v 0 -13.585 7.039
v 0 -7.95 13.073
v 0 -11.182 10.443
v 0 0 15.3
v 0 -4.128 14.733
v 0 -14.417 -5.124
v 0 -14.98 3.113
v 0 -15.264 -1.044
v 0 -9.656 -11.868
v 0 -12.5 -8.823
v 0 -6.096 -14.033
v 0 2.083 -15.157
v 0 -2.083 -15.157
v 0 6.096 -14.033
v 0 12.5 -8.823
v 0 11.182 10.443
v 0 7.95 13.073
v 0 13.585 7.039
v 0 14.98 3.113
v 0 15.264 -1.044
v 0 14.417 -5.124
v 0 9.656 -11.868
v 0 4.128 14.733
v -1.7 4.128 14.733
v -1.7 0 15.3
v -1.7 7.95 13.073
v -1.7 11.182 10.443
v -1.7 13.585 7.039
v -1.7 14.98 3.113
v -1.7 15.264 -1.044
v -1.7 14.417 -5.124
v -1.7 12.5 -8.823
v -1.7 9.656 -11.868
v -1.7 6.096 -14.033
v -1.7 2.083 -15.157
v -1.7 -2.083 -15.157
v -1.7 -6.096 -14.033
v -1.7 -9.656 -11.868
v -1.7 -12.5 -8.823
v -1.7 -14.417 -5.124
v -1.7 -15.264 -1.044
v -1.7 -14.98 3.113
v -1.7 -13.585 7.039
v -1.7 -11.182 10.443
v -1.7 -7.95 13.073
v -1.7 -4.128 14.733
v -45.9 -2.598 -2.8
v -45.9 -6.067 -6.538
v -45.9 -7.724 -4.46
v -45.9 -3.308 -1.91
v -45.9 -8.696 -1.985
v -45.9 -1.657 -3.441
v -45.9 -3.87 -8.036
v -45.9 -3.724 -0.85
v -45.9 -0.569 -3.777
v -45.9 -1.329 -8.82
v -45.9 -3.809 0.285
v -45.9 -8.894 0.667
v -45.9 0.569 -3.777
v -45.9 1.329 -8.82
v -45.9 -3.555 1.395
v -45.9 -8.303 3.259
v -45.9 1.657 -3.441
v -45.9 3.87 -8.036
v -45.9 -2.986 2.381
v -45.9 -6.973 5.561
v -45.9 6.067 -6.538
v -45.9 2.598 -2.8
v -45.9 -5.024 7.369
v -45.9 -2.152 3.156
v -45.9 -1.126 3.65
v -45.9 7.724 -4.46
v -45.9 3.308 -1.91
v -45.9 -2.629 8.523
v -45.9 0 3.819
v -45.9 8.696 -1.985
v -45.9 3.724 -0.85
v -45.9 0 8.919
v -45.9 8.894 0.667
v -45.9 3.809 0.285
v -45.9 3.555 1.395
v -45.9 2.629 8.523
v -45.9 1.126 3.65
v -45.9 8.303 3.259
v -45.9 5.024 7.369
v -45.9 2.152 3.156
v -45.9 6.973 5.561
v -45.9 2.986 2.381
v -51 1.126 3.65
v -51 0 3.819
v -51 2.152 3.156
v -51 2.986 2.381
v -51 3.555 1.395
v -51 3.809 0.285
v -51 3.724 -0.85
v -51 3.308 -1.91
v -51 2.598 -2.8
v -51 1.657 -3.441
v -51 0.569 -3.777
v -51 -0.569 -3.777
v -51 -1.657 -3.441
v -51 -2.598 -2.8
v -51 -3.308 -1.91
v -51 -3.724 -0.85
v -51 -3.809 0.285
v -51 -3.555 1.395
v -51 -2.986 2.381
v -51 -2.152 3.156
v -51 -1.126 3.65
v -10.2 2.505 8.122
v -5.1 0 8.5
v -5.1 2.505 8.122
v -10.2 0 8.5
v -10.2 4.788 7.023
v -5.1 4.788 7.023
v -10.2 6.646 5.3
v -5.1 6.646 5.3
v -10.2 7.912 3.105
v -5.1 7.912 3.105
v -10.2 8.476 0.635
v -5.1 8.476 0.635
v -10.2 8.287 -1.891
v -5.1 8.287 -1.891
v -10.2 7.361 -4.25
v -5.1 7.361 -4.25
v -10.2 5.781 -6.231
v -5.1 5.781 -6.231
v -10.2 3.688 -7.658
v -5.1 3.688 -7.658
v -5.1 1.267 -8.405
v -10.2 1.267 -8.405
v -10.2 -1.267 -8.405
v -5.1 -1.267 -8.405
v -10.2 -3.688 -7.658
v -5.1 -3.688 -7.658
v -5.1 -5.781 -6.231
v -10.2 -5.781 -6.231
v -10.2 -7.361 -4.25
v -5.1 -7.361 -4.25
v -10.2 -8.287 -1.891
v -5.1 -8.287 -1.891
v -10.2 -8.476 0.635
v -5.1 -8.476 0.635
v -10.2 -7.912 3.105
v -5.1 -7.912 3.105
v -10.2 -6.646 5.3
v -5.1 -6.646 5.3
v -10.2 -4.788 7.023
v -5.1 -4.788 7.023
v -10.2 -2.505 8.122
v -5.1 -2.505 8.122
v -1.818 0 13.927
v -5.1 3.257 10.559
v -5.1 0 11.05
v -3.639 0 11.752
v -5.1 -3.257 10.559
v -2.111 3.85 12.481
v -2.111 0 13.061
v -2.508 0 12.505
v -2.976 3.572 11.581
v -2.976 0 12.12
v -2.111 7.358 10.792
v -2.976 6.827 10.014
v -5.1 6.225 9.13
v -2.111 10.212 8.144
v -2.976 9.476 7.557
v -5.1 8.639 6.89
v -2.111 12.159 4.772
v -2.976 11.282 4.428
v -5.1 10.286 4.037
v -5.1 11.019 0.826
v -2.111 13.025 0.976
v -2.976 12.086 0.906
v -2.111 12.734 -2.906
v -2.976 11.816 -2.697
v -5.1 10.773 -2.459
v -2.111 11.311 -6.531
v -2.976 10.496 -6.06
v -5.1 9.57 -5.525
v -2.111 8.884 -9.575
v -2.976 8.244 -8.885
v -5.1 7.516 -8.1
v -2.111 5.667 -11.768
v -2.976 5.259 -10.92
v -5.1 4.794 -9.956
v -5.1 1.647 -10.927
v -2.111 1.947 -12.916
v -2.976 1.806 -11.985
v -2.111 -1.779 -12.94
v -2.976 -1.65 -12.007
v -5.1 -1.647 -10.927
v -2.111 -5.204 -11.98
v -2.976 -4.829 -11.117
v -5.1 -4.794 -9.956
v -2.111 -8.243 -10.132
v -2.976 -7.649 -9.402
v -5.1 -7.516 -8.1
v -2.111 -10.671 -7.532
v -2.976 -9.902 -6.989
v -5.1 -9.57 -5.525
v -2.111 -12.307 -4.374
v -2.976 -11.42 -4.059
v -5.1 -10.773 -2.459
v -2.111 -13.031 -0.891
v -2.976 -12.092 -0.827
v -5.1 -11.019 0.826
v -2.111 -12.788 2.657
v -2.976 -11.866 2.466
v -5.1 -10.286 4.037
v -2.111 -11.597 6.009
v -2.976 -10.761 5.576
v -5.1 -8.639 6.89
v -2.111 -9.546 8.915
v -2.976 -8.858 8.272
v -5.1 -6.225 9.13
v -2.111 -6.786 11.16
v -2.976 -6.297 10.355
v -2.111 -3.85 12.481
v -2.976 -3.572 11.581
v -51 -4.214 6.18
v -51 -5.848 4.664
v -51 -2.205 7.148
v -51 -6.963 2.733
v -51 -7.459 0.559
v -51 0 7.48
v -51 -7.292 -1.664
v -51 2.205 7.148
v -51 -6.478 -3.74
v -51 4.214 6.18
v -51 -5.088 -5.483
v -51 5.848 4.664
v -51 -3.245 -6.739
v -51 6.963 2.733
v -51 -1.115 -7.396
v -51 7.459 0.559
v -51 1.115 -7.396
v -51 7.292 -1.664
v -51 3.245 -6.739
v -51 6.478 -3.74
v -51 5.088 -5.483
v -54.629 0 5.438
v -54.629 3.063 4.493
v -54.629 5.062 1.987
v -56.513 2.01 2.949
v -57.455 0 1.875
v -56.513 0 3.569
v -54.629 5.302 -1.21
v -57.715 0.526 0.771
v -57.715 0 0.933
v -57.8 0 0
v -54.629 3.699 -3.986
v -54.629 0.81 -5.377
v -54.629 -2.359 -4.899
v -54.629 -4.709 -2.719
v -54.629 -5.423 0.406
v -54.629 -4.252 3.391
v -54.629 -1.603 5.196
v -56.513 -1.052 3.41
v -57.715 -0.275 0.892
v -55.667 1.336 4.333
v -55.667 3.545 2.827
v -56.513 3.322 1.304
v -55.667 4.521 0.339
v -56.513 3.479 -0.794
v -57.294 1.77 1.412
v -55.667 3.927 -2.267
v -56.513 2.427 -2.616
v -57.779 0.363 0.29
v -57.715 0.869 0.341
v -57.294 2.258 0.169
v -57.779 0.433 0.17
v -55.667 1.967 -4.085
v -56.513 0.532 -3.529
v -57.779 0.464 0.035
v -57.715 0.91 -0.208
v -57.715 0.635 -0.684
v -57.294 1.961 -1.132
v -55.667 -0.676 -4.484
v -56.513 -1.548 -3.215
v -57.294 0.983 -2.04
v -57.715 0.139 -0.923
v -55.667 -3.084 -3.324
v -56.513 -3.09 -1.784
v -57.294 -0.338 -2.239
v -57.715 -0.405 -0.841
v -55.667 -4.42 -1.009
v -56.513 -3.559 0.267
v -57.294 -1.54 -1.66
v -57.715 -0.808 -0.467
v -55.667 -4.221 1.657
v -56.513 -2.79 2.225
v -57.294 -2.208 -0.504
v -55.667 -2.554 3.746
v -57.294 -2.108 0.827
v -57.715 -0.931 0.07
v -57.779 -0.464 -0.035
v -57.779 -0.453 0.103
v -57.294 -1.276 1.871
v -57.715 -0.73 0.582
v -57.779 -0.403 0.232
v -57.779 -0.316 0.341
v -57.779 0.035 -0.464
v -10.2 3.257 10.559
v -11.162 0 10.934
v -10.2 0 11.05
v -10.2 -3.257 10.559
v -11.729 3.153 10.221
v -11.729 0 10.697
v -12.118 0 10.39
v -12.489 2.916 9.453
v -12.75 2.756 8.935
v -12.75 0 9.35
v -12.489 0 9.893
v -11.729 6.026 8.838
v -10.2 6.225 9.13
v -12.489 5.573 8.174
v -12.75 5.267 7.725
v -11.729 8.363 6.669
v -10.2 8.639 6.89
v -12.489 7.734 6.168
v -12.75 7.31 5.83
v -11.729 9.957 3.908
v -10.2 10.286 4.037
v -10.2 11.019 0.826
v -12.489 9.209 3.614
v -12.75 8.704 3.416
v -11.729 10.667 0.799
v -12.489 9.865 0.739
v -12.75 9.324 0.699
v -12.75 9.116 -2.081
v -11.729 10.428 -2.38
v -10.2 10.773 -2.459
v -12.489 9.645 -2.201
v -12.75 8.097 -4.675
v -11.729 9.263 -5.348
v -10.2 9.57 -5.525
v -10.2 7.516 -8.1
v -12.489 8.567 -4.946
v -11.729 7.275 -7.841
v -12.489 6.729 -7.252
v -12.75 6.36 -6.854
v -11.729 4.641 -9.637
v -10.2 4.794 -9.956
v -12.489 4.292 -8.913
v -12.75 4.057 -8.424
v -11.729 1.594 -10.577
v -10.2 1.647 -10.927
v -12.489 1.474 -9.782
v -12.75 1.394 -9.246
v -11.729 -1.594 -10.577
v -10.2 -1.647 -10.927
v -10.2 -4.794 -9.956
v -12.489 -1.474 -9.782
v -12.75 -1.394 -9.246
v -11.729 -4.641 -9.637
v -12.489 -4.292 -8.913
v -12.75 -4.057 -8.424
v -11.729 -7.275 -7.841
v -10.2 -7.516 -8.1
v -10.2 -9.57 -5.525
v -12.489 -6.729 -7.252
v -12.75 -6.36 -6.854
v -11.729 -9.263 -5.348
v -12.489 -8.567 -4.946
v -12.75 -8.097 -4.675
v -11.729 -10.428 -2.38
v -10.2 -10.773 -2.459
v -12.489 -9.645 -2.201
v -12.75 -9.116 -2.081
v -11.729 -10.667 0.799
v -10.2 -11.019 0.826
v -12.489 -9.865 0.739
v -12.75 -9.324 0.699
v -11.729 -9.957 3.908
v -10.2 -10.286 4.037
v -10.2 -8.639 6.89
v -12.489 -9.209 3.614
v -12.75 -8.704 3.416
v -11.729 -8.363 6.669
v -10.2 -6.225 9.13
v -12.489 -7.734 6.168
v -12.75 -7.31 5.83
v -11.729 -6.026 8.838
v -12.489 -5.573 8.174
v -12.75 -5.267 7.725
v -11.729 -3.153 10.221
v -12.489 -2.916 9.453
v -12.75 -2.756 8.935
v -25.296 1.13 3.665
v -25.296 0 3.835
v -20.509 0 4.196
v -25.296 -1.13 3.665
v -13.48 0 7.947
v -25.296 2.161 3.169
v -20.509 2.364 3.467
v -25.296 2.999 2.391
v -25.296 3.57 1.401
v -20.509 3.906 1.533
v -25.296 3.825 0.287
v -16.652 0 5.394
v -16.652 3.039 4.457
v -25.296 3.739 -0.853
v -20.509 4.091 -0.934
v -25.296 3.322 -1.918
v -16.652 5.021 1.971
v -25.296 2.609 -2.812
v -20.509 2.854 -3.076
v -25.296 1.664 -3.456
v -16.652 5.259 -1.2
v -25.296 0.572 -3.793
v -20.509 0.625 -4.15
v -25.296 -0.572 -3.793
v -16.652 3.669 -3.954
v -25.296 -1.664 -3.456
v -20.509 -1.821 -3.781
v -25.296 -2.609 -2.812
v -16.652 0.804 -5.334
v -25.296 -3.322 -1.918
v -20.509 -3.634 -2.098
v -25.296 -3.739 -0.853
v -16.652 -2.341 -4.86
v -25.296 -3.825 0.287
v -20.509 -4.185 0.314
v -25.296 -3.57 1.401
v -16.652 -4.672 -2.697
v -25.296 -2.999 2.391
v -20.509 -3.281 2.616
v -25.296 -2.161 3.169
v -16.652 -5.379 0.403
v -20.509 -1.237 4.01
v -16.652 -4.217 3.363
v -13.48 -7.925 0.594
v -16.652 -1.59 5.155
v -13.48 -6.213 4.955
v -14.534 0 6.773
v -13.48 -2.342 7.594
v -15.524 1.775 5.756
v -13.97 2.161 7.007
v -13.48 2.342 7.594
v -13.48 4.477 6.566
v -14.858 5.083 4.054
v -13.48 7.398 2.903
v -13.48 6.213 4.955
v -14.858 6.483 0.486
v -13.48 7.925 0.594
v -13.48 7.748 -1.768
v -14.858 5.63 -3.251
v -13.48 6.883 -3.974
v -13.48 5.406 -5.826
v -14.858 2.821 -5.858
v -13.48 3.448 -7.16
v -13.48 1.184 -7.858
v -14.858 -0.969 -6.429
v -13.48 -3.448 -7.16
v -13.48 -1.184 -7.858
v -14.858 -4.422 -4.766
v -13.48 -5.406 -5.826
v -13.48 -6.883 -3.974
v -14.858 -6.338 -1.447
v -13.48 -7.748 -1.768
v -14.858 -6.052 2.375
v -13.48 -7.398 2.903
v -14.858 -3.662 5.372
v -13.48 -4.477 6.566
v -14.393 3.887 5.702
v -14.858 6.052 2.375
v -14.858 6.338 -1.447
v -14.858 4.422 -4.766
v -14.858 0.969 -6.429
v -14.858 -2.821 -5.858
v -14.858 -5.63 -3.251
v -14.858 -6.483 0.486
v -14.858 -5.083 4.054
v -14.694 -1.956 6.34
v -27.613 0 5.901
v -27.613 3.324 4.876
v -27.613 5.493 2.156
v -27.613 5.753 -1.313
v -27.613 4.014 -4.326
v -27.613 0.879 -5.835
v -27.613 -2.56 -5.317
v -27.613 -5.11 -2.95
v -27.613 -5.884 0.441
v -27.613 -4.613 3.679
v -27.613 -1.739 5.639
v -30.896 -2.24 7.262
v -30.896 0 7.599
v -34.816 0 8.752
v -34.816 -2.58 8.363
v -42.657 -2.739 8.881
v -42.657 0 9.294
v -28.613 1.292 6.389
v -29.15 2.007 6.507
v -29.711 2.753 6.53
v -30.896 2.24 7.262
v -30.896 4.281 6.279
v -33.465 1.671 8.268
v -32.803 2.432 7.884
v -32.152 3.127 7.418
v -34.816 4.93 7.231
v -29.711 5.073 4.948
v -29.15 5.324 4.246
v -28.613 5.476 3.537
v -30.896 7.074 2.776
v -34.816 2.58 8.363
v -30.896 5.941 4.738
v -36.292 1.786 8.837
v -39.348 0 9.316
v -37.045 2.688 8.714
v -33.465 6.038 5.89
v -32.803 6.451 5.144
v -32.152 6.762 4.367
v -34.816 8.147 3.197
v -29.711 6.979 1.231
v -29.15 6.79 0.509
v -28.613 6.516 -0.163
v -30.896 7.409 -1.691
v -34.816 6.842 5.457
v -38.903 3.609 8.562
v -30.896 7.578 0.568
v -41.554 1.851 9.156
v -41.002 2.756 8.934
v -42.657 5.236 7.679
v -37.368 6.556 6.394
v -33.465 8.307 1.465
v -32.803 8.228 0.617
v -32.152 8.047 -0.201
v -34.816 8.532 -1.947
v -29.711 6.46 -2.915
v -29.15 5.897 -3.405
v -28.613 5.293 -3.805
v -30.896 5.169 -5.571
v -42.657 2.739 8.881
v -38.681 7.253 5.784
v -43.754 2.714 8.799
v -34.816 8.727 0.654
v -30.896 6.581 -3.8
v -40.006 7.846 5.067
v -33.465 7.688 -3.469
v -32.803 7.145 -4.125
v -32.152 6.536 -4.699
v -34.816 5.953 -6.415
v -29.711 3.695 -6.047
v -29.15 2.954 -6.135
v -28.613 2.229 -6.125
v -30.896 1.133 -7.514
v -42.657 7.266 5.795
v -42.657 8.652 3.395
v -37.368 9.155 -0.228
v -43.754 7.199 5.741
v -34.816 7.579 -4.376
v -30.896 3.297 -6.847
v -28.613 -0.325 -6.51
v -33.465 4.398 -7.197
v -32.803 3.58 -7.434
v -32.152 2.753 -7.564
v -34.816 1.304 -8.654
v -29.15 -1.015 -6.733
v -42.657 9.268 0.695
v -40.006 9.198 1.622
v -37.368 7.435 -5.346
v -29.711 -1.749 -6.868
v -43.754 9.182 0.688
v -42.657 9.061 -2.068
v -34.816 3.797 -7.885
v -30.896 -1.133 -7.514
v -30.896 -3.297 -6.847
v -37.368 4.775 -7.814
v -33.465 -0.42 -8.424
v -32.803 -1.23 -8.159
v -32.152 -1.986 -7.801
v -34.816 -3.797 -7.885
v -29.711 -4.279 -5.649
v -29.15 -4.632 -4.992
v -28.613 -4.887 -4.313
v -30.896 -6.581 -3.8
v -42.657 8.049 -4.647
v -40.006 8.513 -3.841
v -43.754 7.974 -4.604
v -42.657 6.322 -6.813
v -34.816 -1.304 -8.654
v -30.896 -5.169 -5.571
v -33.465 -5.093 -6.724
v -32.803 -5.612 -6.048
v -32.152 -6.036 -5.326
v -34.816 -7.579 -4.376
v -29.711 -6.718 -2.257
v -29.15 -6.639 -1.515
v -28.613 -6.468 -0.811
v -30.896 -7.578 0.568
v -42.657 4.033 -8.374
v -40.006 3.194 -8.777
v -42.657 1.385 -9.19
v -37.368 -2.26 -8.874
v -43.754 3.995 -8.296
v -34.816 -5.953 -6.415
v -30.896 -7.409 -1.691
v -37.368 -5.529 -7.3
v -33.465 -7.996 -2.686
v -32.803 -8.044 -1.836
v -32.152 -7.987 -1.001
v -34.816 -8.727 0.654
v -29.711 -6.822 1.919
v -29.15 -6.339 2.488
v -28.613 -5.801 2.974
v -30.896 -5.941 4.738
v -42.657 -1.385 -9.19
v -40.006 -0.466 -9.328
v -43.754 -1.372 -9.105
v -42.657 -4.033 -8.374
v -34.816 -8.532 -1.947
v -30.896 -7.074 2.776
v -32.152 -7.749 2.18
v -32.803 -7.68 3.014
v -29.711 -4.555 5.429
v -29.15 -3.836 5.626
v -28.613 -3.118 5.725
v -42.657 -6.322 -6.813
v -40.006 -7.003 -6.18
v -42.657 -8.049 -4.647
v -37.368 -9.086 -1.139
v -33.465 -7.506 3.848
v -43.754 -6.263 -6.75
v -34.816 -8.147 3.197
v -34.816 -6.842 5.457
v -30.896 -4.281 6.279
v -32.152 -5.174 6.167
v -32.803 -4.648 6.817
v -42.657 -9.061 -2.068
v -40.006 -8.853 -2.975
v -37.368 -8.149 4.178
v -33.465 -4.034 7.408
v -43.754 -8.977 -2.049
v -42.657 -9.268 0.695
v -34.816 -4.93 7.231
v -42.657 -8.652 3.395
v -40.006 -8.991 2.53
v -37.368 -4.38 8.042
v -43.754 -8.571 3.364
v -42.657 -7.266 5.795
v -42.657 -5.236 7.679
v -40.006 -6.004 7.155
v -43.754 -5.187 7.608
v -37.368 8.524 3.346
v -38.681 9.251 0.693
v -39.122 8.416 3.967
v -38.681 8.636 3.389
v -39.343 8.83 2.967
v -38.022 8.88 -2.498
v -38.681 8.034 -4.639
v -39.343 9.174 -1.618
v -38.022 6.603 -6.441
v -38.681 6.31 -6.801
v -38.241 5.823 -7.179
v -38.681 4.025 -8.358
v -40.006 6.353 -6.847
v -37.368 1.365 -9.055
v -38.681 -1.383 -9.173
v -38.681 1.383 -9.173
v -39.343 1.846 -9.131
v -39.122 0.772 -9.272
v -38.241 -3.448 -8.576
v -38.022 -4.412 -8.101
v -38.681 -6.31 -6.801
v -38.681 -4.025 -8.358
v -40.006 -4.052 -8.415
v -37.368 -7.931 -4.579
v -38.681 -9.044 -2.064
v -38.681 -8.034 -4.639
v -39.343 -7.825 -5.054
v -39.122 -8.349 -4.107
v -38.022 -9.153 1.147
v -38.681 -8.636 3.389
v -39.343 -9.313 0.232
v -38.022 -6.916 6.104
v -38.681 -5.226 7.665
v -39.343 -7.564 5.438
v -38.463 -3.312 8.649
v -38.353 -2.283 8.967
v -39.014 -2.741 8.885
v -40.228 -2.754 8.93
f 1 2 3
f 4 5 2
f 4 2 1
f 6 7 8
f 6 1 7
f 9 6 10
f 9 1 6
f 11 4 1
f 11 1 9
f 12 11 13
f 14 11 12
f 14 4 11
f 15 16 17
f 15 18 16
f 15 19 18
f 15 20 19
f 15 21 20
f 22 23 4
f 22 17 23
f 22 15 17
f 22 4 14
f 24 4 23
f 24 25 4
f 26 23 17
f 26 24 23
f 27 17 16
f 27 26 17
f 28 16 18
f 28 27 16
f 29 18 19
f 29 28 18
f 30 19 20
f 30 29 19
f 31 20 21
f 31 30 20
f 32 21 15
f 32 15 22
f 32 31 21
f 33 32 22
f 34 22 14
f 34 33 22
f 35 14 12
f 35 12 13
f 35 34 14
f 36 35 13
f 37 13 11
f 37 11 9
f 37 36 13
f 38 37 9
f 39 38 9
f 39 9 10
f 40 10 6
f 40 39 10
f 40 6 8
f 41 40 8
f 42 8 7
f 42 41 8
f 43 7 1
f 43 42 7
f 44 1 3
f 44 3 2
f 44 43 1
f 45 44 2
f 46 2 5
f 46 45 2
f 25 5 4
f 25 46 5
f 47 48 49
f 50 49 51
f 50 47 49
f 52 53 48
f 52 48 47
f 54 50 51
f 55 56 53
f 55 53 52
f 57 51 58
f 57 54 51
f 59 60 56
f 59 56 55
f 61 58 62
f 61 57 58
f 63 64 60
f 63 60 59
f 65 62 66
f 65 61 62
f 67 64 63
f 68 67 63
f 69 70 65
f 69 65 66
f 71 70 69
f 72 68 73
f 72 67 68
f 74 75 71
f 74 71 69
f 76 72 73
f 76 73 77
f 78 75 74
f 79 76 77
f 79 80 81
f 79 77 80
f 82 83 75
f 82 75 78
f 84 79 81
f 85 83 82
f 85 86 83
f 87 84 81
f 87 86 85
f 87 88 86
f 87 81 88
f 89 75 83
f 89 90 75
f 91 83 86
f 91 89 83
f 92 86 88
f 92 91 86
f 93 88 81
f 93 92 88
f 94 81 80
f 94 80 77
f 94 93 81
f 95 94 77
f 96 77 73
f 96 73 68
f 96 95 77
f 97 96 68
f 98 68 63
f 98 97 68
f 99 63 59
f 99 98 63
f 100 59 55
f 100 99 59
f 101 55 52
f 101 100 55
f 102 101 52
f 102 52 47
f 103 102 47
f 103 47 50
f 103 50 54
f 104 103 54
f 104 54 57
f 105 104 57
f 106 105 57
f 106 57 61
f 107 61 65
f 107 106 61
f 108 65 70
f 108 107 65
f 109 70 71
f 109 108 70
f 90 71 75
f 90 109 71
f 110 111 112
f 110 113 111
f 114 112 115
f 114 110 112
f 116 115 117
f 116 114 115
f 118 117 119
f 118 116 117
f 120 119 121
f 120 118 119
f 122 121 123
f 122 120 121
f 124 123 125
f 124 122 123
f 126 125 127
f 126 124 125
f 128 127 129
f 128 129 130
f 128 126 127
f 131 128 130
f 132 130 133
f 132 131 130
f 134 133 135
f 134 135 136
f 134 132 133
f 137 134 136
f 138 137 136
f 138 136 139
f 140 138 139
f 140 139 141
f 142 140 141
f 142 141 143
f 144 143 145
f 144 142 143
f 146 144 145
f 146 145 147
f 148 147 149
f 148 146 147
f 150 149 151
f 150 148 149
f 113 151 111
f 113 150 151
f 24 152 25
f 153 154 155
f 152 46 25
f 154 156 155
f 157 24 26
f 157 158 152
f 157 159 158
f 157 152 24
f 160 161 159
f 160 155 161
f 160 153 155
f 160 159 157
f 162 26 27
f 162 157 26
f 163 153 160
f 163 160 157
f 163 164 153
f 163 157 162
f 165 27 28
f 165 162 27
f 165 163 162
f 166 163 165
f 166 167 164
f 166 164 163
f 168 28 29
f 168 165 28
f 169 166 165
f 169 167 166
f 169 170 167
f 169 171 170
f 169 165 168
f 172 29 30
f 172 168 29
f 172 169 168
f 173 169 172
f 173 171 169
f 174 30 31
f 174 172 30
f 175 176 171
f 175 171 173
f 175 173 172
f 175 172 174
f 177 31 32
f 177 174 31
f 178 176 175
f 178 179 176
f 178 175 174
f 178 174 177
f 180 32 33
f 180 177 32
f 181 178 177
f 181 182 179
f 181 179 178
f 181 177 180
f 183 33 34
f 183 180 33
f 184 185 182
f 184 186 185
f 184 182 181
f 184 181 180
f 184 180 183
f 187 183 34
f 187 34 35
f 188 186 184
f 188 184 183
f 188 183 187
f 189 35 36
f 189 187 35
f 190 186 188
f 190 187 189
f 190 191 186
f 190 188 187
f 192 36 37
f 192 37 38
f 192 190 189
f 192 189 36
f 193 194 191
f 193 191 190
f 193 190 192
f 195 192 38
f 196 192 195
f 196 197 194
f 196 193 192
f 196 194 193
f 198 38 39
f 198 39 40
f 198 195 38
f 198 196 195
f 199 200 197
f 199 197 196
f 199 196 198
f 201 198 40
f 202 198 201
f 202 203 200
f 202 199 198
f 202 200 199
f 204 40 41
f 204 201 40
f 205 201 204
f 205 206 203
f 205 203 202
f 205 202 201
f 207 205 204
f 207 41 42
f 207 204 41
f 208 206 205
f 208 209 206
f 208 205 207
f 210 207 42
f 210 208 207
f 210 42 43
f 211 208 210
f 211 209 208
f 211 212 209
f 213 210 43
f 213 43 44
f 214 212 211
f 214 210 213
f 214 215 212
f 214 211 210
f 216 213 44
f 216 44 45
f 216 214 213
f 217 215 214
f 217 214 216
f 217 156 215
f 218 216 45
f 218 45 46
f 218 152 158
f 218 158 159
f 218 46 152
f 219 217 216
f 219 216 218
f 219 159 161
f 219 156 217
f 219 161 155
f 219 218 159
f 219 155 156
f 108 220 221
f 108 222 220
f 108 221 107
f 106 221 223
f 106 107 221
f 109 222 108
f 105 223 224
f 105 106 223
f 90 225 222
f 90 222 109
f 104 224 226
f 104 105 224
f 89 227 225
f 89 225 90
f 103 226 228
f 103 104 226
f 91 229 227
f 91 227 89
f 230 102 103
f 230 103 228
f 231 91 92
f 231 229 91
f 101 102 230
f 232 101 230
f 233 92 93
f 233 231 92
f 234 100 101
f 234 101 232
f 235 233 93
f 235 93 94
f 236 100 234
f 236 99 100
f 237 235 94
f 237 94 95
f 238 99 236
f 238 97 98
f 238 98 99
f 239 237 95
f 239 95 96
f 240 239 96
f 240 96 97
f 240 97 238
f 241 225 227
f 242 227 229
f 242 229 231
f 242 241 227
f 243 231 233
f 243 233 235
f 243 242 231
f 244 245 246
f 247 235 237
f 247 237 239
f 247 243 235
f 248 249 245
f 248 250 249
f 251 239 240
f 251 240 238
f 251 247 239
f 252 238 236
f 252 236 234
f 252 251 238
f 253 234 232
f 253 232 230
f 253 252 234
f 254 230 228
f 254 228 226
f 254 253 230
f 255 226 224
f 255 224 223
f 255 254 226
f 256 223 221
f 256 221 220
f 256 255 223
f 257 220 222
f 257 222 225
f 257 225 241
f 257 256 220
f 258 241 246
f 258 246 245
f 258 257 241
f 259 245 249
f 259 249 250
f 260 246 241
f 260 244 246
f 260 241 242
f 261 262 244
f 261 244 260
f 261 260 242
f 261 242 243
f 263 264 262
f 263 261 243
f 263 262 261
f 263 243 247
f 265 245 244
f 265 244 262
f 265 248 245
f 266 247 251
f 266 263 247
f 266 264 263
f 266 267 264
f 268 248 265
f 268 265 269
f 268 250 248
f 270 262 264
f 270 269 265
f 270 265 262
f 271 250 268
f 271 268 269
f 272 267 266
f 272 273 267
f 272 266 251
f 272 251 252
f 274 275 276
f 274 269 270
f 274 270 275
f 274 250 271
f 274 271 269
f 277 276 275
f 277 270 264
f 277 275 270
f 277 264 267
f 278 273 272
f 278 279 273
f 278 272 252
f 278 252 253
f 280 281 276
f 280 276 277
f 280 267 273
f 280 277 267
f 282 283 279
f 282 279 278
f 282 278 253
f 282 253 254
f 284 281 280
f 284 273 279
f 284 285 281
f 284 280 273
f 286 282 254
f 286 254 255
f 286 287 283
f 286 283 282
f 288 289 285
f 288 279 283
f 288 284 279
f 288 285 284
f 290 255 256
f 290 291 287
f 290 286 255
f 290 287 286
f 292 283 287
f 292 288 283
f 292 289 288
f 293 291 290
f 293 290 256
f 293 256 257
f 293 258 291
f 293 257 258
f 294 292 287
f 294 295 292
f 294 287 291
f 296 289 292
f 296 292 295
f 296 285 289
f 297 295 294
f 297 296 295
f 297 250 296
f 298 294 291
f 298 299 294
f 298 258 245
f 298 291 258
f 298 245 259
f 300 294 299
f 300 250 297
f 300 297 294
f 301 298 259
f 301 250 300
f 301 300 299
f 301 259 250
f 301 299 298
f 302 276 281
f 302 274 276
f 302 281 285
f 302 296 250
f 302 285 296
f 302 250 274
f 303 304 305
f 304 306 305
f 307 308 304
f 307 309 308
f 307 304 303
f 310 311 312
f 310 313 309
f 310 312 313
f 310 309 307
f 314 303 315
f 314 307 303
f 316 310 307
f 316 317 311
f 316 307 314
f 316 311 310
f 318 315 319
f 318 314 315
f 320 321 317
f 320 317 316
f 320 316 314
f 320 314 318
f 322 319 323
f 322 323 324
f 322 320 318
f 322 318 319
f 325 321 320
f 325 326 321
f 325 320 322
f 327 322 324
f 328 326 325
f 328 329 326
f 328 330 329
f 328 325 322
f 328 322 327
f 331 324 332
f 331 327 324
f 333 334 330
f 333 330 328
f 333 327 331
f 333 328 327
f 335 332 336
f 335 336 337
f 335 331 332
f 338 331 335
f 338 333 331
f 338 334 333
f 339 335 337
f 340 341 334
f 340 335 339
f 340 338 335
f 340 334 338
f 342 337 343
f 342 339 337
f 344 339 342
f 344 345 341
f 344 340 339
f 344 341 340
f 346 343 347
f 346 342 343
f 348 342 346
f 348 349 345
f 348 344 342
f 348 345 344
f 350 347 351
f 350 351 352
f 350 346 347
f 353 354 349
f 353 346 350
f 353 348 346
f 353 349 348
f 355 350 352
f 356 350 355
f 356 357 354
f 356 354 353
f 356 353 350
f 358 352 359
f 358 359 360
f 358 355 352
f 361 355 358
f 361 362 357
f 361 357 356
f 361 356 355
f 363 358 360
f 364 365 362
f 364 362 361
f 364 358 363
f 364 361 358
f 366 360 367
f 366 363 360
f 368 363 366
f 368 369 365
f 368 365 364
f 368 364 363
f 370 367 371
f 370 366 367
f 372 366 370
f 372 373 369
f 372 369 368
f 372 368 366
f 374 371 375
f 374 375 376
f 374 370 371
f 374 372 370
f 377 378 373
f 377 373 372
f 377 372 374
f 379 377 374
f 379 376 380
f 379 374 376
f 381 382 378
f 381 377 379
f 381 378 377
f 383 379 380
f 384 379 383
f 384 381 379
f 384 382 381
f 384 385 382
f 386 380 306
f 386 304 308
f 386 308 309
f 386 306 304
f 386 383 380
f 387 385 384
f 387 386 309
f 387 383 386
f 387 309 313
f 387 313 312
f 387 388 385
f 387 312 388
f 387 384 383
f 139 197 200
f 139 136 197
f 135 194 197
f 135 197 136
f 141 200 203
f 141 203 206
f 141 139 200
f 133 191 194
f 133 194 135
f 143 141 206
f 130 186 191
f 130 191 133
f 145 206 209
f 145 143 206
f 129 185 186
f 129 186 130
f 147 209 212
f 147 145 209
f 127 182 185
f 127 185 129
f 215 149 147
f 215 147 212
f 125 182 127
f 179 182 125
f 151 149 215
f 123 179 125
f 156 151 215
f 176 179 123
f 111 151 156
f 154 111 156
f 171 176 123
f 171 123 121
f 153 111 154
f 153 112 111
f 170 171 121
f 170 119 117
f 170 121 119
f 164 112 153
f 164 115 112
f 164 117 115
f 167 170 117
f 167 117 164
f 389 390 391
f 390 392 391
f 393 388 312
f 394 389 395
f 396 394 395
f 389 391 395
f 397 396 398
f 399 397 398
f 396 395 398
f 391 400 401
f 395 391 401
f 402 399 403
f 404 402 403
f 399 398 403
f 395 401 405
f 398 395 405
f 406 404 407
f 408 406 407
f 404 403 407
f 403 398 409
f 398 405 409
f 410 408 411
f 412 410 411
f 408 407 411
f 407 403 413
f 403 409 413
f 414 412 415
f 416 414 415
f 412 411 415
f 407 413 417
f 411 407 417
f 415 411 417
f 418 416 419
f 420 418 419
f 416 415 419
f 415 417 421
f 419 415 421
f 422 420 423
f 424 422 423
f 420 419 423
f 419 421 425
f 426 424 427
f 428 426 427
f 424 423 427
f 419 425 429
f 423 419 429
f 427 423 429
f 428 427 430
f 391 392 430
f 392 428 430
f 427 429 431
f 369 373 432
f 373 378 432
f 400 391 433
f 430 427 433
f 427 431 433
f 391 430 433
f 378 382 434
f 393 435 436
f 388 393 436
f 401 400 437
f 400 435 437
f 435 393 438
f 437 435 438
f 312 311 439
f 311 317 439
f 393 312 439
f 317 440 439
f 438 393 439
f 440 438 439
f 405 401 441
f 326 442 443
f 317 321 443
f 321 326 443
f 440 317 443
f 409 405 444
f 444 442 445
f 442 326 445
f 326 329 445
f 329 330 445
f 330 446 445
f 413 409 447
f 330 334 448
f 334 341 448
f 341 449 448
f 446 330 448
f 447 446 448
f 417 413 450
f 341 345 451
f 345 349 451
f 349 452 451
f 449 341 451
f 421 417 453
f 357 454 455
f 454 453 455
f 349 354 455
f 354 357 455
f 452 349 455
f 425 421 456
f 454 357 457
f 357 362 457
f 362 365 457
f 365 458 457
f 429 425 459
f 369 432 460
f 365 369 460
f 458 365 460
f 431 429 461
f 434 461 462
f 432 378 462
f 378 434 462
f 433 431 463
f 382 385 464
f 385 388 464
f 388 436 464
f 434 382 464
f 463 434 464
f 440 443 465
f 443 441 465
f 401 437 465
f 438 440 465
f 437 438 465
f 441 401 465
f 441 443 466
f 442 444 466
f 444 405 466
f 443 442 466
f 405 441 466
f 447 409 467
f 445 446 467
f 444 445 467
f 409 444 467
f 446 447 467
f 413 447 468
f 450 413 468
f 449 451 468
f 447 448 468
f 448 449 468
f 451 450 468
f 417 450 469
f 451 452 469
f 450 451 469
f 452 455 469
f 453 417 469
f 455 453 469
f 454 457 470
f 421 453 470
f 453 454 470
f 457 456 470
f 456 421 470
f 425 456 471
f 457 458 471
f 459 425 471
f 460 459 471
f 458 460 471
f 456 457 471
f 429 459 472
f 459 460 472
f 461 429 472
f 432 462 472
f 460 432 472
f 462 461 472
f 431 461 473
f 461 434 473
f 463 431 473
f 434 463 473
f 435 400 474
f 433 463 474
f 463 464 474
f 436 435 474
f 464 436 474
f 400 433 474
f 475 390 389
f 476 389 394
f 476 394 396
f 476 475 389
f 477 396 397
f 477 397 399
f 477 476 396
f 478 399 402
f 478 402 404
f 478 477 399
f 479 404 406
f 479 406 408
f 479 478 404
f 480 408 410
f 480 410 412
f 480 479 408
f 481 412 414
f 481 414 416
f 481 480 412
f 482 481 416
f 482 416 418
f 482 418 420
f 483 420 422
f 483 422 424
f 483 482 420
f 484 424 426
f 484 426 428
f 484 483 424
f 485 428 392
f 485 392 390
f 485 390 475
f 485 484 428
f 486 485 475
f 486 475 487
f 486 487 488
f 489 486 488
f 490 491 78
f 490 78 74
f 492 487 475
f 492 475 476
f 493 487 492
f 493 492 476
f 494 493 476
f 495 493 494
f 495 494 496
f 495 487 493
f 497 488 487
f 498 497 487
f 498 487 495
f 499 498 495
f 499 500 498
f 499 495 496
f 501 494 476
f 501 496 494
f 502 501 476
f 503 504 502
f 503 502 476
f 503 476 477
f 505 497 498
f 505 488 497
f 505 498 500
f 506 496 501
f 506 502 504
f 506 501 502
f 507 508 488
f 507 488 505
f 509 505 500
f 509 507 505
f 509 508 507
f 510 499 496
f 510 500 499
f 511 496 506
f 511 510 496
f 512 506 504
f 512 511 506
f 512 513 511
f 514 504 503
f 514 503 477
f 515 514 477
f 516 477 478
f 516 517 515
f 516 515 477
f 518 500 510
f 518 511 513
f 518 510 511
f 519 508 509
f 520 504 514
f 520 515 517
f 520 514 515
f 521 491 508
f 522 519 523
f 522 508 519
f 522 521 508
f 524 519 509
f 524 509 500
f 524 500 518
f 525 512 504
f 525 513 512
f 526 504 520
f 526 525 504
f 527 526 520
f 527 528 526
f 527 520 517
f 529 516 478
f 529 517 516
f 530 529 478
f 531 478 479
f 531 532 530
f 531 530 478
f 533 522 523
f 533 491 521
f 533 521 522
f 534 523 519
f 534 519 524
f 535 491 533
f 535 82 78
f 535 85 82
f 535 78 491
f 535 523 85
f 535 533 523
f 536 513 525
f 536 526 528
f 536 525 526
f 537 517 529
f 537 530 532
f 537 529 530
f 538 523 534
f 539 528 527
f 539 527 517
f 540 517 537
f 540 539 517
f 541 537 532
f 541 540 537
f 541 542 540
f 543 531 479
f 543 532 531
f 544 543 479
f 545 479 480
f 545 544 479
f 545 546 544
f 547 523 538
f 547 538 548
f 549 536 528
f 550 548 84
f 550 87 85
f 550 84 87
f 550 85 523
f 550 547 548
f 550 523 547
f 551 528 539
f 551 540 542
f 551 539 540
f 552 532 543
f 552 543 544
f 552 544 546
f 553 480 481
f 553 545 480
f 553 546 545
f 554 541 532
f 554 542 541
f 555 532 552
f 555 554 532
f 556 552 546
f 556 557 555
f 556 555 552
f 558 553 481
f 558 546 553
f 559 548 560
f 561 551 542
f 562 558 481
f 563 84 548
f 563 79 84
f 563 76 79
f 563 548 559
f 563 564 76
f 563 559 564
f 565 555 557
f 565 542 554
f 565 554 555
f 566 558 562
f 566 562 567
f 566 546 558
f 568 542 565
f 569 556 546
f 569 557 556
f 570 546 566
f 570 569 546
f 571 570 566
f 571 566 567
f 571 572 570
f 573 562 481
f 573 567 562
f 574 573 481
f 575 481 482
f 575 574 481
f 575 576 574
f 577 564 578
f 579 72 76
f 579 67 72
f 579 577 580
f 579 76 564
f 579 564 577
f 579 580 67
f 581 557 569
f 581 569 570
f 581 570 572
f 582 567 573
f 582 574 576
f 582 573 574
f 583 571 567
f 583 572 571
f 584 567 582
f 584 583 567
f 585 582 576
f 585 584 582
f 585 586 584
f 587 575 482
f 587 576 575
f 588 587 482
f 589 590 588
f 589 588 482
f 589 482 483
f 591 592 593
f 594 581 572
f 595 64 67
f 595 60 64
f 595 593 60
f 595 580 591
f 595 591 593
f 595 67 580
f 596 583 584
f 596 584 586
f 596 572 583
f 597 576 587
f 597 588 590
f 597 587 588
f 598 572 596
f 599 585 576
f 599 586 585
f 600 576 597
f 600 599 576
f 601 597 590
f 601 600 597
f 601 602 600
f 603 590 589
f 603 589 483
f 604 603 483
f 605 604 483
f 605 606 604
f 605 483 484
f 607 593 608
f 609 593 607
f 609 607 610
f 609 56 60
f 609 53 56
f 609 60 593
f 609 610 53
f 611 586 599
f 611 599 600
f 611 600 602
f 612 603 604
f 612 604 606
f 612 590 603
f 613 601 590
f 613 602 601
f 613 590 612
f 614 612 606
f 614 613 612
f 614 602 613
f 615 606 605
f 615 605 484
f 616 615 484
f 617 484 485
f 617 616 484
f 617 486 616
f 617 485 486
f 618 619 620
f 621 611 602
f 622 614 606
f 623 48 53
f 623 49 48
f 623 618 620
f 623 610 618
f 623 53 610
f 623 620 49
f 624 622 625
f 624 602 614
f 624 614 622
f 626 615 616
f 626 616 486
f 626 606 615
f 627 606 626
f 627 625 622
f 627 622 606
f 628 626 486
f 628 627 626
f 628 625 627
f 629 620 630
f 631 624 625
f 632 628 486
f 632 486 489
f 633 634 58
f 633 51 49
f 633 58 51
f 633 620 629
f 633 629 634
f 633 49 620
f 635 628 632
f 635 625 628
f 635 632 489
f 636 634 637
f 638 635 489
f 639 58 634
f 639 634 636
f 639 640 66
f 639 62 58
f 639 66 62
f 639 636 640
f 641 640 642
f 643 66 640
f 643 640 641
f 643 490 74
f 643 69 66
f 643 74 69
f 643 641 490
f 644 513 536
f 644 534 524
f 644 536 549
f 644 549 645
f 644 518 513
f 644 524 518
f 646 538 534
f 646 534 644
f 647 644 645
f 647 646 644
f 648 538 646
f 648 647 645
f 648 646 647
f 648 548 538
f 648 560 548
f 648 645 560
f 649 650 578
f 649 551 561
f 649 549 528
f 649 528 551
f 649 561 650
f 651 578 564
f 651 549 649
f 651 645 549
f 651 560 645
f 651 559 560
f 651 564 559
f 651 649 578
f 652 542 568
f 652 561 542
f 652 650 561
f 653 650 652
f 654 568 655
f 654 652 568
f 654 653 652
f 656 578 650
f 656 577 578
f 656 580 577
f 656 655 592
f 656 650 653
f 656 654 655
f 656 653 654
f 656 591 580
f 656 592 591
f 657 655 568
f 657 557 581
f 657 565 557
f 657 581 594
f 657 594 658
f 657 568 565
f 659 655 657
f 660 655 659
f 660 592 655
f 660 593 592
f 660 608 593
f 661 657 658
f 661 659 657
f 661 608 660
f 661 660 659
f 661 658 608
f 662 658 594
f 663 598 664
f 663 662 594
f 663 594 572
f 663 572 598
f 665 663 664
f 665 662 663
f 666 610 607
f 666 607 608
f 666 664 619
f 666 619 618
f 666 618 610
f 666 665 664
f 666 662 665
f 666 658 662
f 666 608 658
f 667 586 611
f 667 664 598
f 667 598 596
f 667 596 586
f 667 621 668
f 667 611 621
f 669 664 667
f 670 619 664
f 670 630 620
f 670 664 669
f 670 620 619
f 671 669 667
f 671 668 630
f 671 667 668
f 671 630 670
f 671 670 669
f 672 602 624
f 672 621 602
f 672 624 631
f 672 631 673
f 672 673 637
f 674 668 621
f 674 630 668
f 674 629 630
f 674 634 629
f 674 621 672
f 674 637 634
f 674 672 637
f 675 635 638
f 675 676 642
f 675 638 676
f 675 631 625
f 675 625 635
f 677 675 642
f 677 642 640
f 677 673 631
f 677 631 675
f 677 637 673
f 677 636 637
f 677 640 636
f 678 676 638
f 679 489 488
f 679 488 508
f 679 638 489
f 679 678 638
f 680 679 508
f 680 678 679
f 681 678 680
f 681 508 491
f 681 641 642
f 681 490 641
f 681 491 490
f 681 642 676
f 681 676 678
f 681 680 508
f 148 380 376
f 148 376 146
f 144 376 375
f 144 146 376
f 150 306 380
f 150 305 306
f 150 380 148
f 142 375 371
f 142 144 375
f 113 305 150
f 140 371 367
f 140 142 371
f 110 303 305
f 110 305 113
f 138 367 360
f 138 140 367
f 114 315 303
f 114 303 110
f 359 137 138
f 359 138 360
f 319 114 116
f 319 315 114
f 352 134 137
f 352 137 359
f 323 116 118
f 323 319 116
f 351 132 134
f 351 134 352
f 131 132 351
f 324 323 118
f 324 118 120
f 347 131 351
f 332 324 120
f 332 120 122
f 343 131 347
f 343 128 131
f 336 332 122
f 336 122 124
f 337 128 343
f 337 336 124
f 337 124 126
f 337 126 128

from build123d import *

# Parameters (mm, degrees)
F2_SCALE = 1.7


with BuildPart() as f1:
    # F0 (on Front) → F1 (revolve)
    with BuildSketch(Plane.XZ):
        with BuildLine():
            Line((-7.5, 0), (0, 0))
            Line((0, 0), (0, 9))
            Line((0, 9), (-1, 9))
            add(Edge.make_bspline(
                [(-1, 9), (-1, 7.0851700753), (-1.8672904698, 7.1124176979), (-3, 6.5)],
                knots=[0, 0, 0, 0, 3.2015621187, 3.2015621187, 3.2015621187, 3.2015621187], degree=3))
            Line((-3, 6.5), (-3, 5))
            Line((-3, 5), (-6, 5))
            Line((-6, 5), (-6, 6.5))
            add(Edge.make_bspline(
                [(-6, 6.5), (-7.0111020468, 6.5), (-7.2953770868, 5.9862987623), (-7.5, 5.5)],
                knots=[0, 0, 0, 0, 1.8027756377, 1.8027756377, 1.8027756377, 1.8027756377], degree=3))
            Line((-7.5, 5.5), (-7.5, 0))
        make_face()
        with BuildLine():
            Line((-14, 0), (-7.5, 0))
            Line((-7.5, 0), (-7.5, 5.5))
            add(Edge.make_bspline(
                [(-14.8800330953, 2.2560865689), (-11.7293745279, 2.1962865721), (-8.3865085617, 3.0558807775), (-7.5, 5.5)],
                knots=[0, 0, 0, 0, 8.0615049982, 8.0615049982, 8.0615049982, 8.0615049982], degree=3))
            add(Edge.make_bspline(
                [(-14, 0), (-14, 1.179963637), (-14.8800330953, 2.2560865689)],
                knots=[3.1415926536, 3.1415926536, 3.1415926536, 3.5642633266, 3.5642633266, 3.5642633266], degree=2, weights=[1, 0.9777516787, 1]))
        make_face()
        with BuildLine():
            Line((-24, 0), (-14, 0))
            add(Edge.make_bspline(
                [(-14, 0), (-14, 1.179963637), (-14.8800330953, 2.2560865689)],
                knots=[3.1415926536, 3.1415926536, 3.1415926536, 3.5642633266, 3.5642633266, 3.5642633266], degree=2, weights=[1, 0.9777516787, 1]))
            add(Edge.make_bspline(
                [(-14.8800330953, 2.2560865689), (-16.7203144761, 4.5064212501), (-21, 5.2466656078)],
                knots=[3.5642633266, 3.5642633266, 3.5642633266, 4.4076963264, 4.4076963264, 4.4076963264], degree=2, weights=[1, 0.9123876747, 1]))
            add(Edge.make_bspline(
                [(-21, 5.2466656078), (-22.4646400472, 5.5), (-24, 5.5)],
                knots=[4.4076963264, 4.4076963264, 4.4076963264, 4.7123889804, 4.7123889804, 4.7123889804], degree=2, weights=[1, 0.9884177258, 1]))
            Line((-24, 5.5), (-24, 0))
        make_face()
        with BuildLine():
            Line((-34, 0), (-24, 0))
            Line((-24, 0), (-24, 5.5))
            add(Edge.make_bspline(
                [(-24, 5.5), (-25.5353599528, 5.5), (-27, 5.2466656078)],
                knots=[4.7123889804, 4.7123889804, 4.7123889804, 5.0170816344, 5.0170816344, 5.0170816344], degree=2, weights=[1, 0.9884177258, 1]))
            Line((-27, 5.2466656078), (-27, 2.2466656078))
            Line((-27, 2.2466656078), (-30, 2.2466656078))
            Line((-30, 2.2466656078), (-30, 4.4))
            add(Edge.make_bspline(
                [(-30, 4.4), (-34, 2.75), (-34, 0)],
                knots=[5.3558900892, 5.3558900892, 5.3558900892, 6.2831853072, 6.2831853072, 6.2831853072], degree=2, weights=[1, 0.894427191, 1]))
        make_face()
    revolve(axis=Axis((-17, 0, 0), (-1, 0, 0)))


with BuildPart() as f1_1:
    # F2: moved
    add(f1.part.scale(F2_SCALE))


solid = f1_1.part
